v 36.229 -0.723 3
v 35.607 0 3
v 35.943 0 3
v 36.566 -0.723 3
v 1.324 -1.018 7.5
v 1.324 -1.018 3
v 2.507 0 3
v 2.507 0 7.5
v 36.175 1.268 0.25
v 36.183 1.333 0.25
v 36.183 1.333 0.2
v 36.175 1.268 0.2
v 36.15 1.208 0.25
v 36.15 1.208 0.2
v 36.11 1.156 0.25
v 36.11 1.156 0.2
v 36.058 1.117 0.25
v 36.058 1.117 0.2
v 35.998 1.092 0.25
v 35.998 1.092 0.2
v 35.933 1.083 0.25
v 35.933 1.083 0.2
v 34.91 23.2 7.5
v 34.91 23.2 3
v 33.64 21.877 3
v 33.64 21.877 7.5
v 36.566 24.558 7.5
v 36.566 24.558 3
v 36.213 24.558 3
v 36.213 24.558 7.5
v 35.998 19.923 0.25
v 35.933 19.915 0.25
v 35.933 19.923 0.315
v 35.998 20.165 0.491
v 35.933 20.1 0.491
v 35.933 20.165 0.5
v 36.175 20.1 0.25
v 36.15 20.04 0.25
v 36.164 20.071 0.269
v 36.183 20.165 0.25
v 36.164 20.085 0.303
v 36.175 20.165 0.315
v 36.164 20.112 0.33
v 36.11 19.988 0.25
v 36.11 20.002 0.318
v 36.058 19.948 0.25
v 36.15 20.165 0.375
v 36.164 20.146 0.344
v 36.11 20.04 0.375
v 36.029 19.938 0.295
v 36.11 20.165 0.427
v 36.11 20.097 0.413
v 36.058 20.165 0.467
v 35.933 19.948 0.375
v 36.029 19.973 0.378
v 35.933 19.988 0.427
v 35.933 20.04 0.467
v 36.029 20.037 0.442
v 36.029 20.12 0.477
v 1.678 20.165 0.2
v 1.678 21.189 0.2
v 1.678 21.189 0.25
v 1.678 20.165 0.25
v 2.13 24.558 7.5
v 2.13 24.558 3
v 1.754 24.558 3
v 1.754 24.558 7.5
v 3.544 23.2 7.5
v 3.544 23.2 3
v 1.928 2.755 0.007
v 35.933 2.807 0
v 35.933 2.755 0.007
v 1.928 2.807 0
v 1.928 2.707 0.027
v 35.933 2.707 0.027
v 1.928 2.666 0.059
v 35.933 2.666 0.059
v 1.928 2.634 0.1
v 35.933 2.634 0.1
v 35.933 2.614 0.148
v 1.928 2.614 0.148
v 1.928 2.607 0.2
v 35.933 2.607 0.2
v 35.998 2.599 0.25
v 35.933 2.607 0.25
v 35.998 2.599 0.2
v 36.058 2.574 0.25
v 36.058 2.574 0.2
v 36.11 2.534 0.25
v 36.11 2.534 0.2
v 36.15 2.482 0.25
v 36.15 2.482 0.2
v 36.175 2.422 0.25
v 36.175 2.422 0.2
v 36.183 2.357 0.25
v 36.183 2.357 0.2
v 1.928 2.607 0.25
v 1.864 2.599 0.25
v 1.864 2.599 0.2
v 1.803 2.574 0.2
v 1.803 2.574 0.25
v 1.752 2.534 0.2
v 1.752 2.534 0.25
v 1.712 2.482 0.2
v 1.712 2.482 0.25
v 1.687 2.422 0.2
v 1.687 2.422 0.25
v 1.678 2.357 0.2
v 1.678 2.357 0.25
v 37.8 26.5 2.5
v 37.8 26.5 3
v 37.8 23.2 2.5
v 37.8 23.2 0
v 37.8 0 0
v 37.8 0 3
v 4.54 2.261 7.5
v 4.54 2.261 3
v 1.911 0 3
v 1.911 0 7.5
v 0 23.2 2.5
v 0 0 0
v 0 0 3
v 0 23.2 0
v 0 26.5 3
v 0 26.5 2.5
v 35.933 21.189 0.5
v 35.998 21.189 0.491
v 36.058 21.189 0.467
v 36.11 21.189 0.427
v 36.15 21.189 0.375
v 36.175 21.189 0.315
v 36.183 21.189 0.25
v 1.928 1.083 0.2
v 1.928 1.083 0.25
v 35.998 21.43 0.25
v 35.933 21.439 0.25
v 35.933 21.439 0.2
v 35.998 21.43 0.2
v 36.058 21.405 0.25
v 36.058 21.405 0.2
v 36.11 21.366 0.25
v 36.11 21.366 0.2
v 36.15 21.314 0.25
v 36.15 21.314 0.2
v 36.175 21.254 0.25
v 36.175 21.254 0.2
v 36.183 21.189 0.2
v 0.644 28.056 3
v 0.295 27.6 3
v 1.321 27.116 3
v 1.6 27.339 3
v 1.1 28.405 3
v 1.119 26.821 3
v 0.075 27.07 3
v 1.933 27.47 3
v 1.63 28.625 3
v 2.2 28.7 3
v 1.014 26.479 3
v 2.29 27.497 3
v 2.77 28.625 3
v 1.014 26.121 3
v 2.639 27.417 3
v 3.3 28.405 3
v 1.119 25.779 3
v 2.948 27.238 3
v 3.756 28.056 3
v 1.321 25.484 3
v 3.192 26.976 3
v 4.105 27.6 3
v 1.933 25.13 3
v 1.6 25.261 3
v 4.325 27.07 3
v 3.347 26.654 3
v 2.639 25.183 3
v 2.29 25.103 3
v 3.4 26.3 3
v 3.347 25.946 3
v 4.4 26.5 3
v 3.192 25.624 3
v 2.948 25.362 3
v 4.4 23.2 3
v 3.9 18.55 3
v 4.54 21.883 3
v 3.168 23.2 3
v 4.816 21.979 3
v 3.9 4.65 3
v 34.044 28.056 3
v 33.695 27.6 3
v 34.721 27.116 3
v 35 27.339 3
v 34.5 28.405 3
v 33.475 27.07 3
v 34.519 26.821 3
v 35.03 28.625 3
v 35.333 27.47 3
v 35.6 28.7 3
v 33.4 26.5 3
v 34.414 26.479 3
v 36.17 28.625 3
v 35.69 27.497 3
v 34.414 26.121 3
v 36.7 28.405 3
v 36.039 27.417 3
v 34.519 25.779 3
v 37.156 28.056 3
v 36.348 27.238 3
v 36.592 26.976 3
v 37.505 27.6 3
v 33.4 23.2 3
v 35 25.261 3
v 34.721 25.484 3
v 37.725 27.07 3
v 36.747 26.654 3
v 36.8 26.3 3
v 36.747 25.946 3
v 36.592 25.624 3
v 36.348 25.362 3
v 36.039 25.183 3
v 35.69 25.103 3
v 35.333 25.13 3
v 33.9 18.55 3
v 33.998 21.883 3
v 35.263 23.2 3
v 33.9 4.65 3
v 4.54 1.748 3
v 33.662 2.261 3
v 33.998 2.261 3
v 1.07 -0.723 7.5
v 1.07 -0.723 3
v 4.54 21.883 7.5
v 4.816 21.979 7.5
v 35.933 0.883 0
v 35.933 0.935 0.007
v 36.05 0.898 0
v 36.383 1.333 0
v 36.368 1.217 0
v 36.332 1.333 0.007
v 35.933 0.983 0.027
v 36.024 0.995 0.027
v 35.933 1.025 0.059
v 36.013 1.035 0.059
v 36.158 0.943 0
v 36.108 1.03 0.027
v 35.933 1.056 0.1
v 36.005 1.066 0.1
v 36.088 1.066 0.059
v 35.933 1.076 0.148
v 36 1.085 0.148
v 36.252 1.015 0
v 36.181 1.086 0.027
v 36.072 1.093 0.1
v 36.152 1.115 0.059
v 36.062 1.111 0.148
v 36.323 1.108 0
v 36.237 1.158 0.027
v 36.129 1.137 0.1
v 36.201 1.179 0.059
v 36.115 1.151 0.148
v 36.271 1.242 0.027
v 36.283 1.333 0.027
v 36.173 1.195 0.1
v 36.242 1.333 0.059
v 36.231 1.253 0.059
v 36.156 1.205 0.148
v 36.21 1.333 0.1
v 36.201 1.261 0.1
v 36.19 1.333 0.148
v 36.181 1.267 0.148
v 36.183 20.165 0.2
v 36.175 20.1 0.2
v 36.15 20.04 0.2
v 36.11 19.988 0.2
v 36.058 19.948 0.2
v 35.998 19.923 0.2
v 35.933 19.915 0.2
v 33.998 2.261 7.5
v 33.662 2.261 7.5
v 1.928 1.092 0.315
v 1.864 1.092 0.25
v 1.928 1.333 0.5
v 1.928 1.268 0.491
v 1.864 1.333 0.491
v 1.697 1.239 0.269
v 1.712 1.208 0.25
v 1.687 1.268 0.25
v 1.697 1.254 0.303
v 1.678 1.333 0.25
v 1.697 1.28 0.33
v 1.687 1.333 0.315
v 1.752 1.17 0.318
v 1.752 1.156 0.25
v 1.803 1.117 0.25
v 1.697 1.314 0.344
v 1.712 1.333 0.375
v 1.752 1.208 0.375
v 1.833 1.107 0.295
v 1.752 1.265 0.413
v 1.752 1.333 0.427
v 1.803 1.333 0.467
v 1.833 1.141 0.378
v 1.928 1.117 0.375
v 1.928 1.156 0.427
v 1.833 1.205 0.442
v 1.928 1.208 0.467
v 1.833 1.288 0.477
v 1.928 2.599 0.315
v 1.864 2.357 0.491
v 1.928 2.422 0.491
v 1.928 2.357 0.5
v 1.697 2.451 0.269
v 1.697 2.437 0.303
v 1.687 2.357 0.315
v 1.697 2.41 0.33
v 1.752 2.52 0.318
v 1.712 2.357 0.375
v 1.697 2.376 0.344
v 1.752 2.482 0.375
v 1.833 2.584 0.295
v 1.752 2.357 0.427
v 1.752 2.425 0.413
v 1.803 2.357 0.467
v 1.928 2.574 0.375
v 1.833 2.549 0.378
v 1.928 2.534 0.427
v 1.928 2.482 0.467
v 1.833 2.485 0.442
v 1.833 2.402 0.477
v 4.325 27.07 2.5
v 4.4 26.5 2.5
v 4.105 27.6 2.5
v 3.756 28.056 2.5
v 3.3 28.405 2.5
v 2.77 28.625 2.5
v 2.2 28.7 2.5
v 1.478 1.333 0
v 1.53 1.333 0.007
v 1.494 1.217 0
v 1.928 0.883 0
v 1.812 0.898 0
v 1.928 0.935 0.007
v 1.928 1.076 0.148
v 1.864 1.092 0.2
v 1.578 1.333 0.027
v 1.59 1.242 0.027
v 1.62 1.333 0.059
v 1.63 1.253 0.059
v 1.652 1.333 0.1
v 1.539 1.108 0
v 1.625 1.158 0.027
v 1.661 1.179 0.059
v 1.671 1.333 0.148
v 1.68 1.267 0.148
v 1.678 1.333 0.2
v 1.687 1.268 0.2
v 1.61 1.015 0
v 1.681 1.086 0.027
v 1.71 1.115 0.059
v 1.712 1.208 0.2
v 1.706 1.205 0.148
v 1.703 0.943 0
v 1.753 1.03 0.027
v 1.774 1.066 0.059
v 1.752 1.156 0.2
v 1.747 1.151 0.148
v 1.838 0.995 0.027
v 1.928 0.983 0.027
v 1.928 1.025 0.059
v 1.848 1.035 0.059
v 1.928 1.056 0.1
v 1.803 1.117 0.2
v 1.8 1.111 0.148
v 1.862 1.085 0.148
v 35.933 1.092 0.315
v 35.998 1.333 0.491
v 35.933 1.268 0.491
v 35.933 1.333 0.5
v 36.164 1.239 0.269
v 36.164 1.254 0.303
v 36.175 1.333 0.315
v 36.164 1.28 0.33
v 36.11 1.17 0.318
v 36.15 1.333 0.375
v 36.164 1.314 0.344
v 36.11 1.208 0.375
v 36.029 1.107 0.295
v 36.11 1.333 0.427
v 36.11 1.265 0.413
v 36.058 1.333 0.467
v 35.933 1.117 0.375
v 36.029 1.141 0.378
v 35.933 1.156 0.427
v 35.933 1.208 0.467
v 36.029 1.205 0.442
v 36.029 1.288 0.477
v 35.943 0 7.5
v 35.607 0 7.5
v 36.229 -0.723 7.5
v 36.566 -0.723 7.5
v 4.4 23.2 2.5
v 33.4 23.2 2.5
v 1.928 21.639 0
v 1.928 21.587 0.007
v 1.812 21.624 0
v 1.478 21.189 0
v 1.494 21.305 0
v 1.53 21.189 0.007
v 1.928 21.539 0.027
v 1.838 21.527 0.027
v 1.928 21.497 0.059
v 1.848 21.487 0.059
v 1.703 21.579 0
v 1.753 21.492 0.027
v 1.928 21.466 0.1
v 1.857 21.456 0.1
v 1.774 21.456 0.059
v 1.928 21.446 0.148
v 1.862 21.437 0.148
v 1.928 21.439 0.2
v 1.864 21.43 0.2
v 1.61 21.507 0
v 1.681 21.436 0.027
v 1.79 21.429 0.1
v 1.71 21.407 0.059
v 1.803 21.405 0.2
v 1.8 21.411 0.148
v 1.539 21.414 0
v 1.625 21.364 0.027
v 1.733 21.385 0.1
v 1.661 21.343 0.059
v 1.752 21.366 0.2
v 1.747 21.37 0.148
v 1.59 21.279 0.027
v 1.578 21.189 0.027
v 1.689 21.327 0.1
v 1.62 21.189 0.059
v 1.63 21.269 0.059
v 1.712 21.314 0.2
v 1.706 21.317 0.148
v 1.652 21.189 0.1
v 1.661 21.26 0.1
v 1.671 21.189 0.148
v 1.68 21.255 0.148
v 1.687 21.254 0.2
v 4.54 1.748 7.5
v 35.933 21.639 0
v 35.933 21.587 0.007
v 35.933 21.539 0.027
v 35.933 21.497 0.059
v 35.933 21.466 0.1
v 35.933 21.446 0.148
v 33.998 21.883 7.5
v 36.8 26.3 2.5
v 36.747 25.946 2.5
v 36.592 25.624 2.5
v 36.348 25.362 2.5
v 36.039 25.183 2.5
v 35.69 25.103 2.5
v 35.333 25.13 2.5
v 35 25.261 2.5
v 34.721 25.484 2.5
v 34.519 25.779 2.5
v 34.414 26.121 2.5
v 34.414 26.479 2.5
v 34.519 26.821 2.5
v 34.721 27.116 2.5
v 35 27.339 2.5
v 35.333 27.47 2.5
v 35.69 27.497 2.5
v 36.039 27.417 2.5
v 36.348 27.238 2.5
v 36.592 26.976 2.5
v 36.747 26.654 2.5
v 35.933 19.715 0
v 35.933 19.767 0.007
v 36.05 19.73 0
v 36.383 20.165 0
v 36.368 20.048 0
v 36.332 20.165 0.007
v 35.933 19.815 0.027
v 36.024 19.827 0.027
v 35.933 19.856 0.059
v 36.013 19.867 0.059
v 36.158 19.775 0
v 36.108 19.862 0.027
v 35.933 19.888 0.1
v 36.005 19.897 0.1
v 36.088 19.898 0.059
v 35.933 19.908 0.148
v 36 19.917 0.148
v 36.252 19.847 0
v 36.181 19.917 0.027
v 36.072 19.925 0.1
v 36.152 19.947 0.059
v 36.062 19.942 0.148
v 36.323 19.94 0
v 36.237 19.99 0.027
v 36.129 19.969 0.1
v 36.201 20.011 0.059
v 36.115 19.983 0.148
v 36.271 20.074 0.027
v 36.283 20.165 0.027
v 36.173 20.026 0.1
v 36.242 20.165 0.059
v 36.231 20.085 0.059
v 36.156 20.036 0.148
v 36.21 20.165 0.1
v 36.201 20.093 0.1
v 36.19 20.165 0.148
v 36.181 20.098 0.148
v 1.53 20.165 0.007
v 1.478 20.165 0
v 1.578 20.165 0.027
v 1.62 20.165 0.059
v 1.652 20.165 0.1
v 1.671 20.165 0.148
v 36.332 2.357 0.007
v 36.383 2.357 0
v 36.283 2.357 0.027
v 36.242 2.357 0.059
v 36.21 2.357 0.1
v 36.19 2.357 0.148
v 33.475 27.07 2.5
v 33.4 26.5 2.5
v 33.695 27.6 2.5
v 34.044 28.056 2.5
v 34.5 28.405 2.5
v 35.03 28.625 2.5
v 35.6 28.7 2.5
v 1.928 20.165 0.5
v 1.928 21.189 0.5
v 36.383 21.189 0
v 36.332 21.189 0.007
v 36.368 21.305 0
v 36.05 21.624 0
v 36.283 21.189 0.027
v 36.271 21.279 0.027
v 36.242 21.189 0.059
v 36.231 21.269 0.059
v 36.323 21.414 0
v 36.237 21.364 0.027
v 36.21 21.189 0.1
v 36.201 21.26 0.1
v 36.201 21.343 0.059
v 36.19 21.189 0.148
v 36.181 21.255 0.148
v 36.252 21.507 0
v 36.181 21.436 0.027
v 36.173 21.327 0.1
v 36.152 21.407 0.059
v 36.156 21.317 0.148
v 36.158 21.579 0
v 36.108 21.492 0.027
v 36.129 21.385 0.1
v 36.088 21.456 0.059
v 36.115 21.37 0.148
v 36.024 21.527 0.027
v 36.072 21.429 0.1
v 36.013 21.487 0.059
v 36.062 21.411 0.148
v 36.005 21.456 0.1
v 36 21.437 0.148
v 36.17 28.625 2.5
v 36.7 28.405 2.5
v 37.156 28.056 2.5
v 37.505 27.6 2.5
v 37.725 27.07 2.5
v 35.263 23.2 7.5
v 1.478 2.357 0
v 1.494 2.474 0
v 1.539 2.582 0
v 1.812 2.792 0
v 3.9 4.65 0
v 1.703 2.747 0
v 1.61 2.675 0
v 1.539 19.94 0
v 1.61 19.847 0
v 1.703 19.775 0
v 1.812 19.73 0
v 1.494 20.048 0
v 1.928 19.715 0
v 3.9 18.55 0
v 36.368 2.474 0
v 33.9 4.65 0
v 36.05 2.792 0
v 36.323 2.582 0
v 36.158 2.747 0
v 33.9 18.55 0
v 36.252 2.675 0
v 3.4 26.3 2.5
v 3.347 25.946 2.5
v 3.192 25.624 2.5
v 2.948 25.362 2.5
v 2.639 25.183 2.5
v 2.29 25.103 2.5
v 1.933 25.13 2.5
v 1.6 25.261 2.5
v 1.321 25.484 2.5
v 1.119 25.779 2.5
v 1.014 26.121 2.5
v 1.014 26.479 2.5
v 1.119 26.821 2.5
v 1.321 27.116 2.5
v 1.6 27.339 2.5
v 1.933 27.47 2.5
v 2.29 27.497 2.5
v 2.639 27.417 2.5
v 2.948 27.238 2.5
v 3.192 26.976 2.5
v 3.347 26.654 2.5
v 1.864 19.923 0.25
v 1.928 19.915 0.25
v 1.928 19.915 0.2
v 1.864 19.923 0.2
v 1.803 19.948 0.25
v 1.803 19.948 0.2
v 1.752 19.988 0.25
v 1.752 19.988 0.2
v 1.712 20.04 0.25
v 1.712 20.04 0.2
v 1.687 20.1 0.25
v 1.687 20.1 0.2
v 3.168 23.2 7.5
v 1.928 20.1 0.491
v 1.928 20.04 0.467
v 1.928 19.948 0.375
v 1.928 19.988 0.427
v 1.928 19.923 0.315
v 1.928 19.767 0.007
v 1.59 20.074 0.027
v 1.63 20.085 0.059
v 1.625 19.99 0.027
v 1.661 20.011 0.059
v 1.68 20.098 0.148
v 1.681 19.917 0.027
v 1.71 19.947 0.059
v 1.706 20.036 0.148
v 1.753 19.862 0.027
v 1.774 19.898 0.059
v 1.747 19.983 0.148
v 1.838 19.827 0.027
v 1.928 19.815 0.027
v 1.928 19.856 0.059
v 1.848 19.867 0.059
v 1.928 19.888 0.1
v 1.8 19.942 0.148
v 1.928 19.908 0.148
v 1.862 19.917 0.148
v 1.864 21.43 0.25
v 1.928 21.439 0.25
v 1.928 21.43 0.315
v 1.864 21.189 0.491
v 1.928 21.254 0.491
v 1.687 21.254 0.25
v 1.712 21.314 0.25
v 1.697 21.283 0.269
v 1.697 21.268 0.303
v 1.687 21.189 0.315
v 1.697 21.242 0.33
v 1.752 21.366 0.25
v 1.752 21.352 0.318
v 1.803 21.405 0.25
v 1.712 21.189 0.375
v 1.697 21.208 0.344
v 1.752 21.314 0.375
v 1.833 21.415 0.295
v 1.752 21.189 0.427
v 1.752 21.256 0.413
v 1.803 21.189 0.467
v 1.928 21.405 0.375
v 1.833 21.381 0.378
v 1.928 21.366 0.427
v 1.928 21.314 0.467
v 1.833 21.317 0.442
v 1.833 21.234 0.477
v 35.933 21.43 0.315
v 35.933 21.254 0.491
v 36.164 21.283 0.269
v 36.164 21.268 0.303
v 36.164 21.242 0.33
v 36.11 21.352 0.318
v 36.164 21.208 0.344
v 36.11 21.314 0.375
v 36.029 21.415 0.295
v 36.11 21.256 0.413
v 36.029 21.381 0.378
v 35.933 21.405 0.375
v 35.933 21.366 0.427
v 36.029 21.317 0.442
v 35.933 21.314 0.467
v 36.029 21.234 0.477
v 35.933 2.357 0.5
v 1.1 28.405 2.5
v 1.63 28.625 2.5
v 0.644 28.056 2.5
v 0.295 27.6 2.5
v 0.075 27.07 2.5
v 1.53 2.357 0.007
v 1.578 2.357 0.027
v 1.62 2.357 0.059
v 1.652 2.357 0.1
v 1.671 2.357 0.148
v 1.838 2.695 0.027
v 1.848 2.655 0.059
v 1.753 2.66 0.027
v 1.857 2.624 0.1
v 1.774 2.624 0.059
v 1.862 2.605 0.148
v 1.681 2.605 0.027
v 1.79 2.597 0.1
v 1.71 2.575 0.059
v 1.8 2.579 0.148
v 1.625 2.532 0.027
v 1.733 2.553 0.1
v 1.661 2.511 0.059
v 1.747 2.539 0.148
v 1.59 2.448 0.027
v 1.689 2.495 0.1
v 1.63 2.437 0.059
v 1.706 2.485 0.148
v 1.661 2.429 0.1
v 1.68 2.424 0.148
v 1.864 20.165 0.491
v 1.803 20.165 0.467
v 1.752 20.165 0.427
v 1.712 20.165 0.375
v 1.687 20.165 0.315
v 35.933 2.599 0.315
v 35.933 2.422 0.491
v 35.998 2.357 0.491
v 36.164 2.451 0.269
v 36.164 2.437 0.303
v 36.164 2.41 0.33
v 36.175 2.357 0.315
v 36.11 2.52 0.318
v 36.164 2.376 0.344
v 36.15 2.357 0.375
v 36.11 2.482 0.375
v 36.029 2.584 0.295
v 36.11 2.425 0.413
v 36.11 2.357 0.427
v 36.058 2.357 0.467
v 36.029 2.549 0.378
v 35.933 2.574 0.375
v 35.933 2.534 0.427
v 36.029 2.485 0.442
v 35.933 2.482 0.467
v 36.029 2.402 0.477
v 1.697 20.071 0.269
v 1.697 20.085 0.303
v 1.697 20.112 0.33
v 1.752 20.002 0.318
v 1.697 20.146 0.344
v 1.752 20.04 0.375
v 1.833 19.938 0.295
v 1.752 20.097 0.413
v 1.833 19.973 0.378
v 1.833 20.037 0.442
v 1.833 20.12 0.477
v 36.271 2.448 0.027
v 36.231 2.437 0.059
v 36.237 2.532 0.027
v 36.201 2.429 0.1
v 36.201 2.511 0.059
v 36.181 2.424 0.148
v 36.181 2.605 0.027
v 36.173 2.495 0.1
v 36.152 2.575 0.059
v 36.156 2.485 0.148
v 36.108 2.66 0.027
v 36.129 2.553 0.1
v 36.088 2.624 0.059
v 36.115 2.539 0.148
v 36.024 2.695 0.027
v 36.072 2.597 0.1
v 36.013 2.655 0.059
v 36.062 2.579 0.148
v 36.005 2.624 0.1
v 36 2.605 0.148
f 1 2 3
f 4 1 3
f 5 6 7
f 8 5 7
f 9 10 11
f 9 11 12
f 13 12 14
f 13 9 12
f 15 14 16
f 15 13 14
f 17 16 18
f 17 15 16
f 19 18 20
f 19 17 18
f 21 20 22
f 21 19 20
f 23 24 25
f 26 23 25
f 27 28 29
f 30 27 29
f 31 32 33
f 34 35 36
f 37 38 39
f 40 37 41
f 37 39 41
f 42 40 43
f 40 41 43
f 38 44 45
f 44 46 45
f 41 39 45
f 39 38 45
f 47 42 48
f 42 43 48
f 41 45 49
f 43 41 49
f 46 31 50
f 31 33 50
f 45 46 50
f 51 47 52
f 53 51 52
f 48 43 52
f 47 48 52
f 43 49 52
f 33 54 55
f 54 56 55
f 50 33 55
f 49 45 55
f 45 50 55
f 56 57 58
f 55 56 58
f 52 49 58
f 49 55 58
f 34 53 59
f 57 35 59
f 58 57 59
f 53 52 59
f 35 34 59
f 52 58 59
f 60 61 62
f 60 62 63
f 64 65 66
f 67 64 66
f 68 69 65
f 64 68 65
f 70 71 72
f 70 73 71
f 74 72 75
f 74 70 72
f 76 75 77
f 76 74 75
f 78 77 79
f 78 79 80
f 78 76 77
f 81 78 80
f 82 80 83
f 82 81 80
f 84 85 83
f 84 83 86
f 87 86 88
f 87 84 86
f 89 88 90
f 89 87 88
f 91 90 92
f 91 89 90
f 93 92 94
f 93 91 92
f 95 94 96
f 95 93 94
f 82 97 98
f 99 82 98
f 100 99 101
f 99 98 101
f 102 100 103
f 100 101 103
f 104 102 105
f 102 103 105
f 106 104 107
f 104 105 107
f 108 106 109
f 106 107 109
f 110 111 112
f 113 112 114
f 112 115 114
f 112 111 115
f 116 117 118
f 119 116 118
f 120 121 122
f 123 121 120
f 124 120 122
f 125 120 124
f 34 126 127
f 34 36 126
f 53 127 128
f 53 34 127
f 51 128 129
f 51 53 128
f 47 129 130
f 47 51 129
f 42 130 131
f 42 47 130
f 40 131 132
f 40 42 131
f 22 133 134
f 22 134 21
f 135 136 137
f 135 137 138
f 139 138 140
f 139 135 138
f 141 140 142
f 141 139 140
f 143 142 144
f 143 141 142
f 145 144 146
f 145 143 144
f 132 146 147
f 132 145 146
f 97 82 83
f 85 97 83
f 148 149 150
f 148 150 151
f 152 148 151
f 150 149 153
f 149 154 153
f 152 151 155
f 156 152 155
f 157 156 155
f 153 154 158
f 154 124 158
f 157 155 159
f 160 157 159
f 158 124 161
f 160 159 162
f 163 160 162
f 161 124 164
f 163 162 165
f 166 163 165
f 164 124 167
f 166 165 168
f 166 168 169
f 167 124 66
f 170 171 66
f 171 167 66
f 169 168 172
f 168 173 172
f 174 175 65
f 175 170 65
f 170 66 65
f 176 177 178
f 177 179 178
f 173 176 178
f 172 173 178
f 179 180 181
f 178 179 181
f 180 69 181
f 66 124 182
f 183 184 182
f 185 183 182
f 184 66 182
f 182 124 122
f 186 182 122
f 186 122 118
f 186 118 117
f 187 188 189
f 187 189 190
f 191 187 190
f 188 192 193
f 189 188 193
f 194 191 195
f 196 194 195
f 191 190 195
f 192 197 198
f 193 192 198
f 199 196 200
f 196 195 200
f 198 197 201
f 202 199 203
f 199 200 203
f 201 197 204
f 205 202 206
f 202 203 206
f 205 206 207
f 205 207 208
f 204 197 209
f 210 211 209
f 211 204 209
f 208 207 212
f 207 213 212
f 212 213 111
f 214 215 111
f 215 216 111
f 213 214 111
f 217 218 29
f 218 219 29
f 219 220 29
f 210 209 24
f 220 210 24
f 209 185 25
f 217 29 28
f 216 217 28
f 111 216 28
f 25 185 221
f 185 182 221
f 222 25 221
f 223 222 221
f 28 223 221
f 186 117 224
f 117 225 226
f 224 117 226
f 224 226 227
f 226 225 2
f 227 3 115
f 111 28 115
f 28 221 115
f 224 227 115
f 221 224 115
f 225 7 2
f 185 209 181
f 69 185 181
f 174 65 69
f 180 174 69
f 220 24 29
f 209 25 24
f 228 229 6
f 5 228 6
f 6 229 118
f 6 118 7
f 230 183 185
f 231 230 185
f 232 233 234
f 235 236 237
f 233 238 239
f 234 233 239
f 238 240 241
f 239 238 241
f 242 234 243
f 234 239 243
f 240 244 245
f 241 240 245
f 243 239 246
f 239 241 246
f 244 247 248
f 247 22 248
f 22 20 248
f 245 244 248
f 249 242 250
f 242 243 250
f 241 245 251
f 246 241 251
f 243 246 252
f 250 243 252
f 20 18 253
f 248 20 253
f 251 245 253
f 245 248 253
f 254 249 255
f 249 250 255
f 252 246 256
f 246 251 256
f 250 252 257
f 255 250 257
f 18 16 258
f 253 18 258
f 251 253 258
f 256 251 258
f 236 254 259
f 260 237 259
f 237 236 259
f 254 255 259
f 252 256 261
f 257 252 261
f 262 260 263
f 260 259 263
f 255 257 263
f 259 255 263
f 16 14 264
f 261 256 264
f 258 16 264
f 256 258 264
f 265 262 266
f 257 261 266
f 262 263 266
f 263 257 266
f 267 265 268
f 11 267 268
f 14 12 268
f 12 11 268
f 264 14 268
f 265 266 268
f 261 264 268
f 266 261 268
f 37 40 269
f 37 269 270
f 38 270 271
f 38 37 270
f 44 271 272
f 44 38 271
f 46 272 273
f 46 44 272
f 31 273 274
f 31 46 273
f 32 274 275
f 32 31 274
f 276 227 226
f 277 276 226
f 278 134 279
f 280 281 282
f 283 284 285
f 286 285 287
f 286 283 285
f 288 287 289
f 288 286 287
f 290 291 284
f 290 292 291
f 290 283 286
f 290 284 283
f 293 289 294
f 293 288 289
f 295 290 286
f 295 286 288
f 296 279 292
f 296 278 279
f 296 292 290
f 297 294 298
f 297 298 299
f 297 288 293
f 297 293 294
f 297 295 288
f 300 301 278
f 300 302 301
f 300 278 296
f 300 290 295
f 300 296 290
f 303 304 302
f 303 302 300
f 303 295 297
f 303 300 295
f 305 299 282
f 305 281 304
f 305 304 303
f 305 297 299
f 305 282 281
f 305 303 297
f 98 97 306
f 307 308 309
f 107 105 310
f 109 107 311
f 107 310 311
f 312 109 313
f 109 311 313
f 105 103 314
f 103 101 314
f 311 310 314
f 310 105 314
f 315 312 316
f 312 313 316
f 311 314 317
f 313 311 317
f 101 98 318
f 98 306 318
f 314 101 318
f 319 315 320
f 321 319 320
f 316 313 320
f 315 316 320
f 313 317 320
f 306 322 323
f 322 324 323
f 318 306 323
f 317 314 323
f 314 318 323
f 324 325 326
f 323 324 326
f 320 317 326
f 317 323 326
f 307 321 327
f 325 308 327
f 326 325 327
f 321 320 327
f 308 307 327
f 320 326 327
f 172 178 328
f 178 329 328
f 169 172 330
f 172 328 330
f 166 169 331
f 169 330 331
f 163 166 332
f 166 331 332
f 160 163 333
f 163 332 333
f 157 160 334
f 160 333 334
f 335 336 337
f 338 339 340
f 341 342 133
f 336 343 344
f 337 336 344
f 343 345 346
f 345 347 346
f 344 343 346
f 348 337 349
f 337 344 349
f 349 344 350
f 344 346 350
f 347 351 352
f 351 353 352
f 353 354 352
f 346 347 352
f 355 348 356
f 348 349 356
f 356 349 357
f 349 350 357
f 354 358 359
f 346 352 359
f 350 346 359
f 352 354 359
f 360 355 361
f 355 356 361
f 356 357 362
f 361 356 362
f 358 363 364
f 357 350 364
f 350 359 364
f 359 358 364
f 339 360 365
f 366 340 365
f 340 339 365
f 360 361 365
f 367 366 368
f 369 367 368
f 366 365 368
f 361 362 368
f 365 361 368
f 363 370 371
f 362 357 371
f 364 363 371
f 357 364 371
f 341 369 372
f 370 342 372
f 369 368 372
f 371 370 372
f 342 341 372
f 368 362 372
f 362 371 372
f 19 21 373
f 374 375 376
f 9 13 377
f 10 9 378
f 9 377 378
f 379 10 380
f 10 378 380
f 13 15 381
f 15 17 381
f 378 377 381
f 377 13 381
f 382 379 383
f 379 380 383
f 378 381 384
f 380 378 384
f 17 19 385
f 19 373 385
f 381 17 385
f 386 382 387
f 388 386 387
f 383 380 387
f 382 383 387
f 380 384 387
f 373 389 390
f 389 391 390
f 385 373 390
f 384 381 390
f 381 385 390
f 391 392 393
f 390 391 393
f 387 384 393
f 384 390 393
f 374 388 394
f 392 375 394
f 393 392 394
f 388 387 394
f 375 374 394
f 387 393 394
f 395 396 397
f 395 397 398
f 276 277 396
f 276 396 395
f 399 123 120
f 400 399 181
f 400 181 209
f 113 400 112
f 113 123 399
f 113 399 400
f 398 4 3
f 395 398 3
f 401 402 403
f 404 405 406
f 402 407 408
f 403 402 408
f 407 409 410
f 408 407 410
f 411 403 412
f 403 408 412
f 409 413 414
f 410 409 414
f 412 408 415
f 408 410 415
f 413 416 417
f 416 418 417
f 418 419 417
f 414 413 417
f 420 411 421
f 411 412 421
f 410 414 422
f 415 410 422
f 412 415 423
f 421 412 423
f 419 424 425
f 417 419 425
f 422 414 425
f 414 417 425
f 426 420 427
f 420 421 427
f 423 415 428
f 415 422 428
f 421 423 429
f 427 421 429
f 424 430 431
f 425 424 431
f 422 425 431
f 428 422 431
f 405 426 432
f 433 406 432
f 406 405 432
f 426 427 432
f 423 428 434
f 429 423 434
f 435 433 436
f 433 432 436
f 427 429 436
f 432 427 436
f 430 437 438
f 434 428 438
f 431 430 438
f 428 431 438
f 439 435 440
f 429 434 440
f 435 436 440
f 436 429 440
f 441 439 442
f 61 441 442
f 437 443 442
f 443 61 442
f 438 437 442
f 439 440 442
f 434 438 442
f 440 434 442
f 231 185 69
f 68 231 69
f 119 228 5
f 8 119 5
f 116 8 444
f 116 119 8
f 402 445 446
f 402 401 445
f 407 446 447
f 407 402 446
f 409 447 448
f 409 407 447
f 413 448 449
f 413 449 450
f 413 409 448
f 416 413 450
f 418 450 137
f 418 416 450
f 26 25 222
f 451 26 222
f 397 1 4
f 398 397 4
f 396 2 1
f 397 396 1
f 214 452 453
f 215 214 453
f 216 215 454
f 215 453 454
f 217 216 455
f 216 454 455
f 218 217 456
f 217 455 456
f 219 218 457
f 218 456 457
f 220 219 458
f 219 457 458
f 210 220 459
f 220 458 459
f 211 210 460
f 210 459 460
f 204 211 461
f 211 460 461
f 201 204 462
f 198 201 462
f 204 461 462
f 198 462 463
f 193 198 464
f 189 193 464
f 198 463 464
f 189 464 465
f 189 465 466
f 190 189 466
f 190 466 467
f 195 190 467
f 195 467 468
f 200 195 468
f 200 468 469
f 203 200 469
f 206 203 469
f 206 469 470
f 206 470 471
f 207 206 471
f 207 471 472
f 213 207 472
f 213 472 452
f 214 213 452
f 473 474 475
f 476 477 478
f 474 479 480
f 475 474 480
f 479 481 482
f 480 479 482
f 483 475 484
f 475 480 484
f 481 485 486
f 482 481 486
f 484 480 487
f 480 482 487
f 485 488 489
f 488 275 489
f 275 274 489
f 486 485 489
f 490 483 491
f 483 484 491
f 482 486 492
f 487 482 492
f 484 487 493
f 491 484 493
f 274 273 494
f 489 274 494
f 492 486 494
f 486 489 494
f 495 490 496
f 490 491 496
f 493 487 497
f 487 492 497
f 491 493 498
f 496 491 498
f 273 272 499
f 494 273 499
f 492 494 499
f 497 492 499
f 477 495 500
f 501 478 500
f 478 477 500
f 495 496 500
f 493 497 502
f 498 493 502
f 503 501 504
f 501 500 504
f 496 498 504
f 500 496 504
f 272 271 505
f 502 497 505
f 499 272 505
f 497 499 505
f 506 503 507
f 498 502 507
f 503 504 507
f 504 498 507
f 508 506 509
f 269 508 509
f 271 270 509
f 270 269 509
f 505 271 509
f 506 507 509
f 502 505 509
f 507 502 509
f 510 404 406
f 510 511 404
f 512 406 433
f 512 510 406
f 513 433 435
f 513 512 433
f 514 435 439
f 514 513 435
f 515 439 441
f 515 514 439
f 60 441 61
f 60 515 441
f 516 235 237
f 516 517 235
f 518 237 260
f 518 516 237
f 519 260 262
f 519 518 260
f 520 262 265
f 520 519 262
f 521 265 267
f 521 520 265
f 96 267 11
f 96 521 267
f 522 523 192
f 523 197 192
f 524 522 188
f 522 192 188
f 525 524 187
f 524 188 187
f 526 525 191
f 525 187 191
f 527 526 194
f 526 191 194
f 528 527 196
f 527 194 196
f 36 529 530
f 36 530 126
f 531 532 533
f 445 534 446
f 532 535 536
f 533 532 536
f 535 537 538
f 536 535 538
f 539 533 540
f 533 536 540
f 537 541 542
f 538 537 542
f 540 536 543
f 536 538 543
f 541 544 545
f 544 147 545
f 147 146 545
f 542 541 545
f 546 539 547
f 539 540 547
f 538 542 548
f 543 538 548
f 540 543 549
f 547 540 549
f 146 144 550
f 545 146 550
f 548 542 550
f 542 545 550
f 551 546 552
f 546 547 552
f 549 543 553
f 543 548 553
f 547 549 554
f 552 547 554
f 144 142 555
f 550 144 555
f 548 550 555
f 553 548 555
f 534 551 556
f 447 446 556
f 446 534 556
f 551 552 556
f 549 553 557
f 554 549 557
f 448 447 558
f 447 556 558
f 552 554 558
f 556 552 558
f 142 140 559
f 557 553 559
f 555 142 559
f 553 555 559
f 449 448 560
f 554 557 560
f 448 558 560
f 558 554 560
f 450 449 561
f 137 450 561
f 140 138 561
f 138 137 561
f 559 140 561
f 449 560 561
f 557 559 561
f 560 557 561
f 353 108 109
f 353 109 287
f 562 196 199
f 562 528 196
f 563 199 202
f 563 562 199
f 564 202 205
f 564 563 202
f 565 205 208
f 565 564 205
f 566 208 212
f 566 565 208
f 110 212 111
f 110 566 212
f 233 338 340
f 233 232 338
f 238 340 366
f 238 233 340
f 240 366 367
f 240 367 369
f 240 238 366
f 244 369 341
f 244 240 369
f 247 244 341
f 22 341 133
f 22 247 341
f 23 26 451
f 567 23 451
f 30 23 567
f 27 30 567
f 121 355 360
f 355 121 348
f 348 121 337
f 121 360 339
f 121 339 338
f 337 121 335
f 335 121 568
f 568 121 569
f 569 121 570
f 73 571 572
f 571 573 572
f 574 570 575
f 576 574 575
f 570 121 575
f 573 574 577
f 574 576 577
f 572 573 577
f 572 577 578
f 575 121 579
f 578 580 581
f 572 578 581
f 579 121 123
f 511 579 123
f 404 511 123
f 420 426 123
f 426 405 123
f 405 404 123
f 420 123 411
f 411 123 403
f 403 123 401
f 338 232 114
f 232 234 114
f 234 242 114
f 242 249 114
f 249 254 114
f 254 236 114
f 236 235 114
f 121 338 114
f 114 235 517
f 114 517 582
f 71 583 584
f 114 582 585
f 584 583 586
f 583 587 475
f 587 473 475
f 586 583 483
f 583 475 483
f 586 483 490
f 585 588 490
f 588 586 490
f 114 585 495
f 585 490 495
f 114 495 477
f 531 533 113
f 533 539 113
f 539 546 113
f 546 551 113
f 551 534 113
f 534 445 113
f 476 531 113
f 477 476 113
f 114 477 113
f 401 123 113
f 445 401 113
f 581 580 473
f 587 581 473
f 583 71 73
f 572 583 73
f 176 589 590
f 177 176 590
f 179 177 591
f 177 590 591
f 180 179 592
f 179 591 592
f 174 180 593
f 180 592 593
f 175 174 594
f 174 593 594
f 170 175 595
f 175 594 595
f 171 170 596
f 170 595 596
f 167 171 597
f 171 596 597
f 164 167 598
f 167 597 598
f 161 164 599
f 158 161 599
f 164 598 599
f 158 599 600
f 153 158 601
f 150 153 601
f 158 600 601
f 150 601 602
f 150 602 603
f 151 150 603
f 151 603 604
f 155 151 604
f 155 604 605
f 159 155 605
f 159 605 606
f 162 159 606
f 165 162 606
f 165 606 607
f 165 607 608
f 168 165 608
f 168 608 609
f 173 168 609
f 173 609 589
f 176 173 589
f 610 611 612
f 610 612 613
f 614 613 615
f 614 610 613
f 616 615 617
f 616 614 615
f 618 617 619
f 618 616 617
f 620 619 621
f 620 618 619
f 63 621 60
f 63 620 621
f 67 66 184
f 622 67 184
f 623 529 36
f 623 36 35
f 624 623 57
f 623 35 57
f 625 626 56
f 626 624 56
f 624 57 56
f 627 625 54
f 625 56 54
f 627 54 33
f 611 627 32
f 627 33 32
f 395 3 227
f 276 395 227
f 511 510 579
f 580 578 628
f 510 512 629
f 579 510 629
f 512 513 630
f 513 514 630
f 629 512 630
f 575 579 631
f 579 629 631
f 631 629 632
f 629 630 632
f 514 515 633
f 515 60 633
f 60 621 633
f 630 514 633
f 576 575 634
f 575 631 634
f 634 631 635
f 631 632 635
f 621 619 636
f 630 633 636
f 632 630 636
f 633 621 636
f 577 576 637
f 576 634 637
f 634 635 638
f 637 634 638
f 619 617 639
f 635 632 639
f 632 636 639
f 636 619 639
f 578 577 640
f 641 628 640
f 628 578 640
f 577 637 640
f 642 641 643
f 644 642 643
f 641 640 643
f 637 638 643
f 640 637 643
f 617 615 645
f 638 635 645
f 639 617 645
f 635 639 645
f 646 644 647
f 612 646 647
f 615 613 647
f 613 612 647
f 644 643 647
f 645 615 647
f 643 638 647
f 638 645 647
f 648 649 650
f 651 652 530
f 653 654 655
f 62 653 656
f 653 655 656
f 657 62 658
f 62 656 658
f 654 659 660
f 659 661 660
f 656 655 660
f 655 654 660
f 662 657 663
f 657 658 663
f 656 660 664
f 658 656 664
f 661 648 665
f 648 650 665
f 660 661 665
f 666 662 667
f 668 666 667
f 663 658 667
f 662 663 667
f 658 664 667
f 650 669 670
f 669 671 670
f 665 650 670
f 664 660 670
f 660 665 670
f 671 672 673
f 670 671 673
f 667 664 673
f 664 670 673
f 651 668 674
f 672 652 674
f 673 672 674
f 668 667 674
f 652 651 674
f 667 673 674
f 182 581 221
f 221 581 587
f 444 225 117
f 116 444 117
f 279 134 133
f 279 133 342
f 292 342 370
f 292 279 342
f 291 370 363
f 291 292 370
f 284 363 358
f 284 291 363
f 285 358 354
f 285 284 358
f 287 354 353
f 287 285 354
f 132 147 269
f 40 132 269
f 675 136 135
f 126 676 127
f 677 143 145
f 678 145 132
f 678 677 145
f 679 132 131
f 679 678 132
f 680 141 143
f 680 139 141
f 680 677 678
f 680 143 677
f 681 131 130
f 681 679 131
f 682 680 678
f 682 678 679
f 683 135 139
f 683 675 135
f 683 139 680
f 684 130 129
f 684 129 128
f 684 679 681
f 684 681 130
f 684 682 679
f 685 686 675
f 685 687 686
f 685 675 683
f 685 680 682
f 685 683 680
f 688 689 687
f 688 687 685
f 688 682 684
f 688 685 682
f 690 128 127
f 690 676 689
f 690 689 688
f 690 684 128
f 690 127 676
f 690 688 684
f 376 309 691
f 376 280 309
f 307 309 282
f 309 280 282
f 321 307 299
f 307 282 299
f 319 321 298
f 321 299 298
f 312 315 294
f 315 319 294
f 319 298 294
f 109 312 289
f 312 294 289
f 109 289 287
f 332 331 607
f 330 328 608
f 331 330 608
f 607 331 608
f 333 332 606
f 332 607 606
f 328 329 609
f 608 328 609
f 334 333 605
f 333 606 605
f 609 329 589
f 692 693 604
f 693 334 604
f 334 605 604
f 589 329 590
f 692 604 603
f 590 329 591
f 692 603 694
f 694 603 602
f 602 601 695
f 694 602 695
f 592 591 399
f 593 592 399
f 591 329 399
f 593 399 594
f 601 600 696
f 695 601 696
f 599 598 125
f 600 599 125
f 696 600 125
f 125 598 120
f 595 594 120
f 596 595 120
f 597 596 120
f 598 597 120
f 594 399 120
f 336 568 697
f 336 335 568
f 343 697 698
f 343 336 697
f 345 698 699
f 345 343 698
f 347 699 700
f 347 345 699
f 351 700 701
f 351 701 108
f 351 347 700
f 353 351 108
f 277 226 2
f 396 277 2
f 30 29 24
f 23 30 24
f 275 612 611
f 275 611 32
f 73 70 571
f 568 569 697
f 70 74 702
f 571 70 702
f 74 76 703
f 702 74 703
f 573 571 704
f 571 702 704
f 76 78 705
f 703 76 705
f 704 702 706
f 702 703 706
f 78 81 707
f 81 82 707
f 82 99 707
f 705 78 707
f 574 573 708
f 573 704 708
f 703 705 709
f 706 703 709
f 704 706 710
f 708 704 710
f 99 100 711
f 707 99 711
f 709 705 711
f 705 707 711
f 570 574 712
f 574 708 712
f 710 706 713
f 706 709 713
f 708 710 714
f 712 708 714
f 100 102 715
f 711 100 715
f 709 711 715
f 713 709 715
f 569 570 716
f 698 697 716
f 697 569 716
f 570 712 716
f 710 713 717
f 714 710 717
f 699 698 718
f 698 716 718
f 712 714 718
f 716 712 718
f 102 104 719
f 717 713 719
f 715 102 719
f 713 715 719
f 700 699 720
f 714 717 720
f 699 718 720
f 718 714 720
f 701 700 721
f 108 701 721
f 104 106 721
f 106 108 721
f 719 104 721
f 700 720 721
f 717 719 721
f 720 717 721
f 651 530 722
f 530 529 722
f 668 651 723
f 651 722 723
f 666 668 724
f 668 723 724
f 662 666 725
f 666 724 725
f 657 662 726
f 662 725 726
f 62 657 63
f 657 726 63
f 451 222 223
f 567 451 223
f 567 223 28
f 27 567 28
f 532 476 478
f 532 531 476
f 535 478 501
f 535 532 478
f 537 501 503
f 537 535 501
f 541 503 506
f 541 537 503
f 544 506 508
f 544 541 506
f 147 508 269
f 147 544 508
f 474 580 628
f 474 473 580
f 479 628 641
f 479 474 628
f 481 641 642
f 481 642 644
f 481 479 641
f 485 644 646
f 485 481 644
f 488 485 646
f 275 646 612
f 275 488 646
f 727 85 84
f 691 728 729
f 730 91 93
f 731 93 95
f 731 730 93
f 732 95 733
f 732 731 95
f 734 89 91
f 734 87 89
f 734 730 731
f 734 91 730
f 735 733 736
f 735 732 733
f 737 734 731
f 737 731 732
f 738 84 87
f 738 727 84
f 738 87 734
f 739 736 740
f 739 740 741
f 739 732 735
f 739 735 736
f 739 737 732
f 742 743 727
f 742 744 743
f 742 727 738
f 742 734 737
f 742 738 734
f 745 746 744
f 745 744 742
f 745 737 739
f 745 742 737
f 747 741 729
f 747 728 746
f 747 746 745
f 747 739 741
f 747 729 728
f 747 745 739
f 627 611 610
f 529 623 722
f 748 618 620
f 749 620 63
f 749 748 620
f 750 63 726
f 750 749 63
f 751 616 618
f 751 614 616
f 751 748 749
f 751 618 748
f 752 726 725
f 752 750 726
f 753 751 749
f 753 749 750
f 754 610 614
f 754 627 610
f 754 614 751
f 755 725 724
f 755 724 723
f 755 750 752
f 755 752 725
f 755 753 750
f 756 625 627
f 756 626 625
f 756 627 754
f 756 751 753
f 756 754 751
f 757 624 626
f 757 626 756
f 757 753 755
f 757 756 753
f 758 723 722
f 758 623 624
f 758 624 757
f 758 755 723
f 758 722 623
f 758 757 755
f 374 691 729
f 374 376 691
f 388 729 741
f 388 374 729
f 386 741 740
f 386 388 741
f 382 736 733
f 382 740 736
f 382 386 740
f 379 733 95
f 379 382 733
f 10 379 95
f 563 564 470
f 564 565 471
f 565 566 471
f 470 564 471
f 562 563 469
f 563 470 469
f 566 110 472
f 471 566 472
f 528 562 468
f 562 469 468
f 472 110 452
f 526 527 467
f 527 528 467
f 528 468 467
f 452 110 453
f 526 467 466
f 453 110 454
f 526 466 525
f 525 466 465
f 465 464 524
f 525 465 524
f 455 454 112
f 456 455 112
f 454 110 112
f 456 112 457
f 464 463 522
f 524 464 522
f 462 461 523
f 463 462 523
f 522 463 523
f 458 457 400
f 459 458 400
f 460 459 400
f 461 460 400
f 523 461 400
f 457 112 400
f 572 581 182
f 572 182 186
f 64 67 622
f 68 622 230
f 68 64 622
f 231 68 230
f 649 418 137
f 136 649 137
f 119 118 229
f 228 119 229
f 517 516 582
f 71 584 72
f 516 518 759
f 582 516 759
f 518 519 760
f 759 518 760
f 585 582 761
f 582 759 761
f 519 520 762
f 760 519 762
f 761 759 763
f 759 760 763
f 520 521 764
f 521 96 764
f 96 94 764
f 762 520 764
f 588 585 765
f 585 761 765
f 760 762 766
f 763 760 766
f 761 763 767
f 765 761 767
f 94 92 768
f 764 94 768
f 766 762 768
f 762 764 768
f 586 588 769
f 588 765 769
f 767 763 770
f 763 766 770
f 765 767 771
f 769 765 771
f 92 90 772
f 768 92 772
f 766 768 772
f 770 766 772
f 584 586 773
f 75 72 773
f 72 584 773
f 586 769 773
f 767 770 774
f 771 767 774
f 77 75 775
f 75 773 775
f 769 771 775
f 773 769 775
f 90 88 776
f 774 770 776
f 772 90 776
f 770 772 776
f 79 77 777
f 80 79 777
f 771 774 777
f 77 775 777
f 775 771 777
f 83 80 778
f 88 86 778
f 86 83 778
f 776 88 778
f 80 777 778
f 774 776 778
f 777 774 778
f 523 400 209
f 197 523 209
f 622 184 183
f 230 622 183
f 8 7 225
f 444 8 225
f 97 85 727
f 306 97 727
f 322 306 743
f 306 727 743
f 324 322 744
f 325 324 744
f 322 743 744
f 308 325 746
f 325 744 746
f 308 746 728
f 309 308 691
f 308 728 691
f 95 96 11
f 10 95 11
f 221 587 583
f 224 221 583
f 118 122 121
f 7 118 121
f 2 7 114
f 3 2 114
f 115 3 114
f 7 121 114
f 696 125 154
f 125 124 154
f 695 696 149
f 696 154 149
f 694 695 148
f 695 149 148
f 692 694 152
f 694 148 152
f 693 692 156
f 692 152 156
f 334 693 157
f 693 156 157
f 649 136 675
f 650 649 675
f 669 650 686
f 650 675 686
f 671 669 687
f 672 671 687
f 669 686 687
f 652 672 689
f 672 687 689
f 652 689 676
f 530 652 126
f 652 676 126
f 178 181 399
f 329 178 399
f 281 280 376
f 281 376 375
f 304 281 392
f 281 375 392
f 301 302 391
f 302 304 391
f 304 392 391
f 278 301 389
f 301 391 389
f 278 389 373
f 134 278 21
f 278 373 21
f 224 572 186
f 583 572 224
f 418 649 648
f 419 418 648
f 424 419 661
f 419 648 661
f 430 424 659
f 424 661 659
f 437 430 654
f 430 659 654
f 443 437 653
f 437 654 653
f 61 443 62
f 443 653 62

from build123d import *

# Parameters (mm, degrees)
F0_W      = 37.8
F0_H      = 23.2
F1_DEPTH  = 3
F3_DEPTH  = 4.5
F4_W      = 30
F4_H      = 13.9
F5_DEPTH  = 25.4
F4_W_2    = 34.5051246695
F4_H_2    = 1.524
F6_DEPTH  = 0.5
F7_R      = 0.25
F8_R      = 0.2
F9_R      = 0.2
F11_DEPTH = 5.5
F12_R     = 2.19964
F13_R     = 2.19964
F15_R     = 1.2
F14_R     = 1.2
F16_DEPTH = 25.4


with BuildPart() as f1:
    # F0 (on Top) → F1 (new body)
    with BuildSketch(Plane.XY):
        with Locations((18.9, 11.6)):
            Rectangle(F0_W, F0_H)
    extrude(amount=F1_DEPTH)

    # F2 (on face) → F3 (join)
    with BuildSketch(Plane.XY.offset(3)):
        Polygon((1.7535259355, 24.5575234294), (3.1678657052, 23.2), (3.544374615, 23.2), (2.1300348453, 24.5575234294), align=None)
        Polygon((3.544374615, 23.2), (3.1678657052, 23.2), (4.5401435345, 21.8828488141), (4.8160737062, 21.97938714), align=None)
        Polygon((2.5074673859, 0), (1.9109652349, 0), (1.0702608852, -0.7231329801), (1.3239181902, -1.0180314366), align=None)
        Polygon((4.5401435345, 1.7484091301), (4.5401435345, 2.2614912596), (1.9109652349, 0), (2.5074673859, 0), align=None)
        Polygon((33.6620093499, 2.2614912596), (35.6072341062, 0), (35.9434980693, 0), (33.998273313, 2.2614912596), align=None)
        Polygon((35.9434980693, 0), (35.6072341062, 0), (36.2292379141, -0.7231329801), (36.5655018772, -0.7231329801), align=None)
        Polygon((36.2128205597, 24.5575234294), (34.9098310654, 23.2), (35.2625123829, 23.2), (36.5655018772, 24.5575234294), align=None)
        Polygon((35.2625123829, 23.2), (34.9098310654, 23.2), (33.6403721345, 21.8774104865), (33.998273313, 21.8828488141), align=None)
    extrude(amount=F3_DEPTH)

    # F4 (on face) → F5 (cut)
    with BuildSketch(Plane(origin=(0, 0, 0), x_dir=(1, 0, 0), z_dir=(0, 0, -1))):
        with Locations((18.9, -11.6)):
            Rectangle(F4_W, F4_H)
    extrude(amount=-F5_DEPTH, mode=Mode.SUBTRACT)

    # F4 (on face) → F6 (cut)
    with BuildSketch(Plane(origin=(0, 0, 0), x_dir=(1, 0, 0), z_dir=(0, 0, -1))):
        with Locations((18.9, -11.6)):
            Rectangle(F4_W, F4_H)
        with Locations((18.9308619592, -1.8450859749)):
            Rectangle(F4_W_2, F4_H_2)
        with Locations((18.9308619592, -20.676838914)):
            Rectangle(F4_W_2, F4_H_2)
    extrude(amount=-F6_DEPTH, mode=Mode.SUBTRACT)

    # F7
    f7_edges = [f1.edges().sort_by_distance(p)[0] for p in [
        (18.930862, 2.607086, 0.5),
        (18.930862, 1.083086, 0.5),
        (18.930862, 19.914839, 0.5),
        (18.930862, 21.438839, 0.5),
        (1.6783, 19.914839, 0.25),
        (1.6783, 21.438839, 0.25),
        (1.6783, 2.607086, 0.25),
        (1.6783, 1.083086, 0.25),
        (1.6783, 1.845086, 0.5),
        (1.6783, 20.676839, 0.5),
        (36.183424, 19.914839, 0.25),
        (36.183424, 21.438839, 0.25),
        (36.183424, 20.676839, 0.5),
        (36.183424, 1.083086, 0.25),
        (36.183424, 2.607086, 0.25),
        (36.183424, 1.845086, 0.5),
    ]]
    fillet(f7_edges, radius=F7_R)

    # F8
    f8_edges = [f1.edges().sort_by_distance(p)[0] for p in [
        (18.930862, 1.083086, 0),
        (36.183424, 1.845086, 0),
        (36.110201, 1.156309, 0),
        (36.110201, 2.533863, 0),
        (1.6783, 1.845086, 0),
        (1.751523, 1.156309, 0),
        (1.751523, 2.533863, 0),
        (18.930862, 2.607086, 0),
    ]]
    fillet(f8_edges, radius=F8_R)

    # F9
    f9_edges = [f1.edges().sort_by_distance(p)[0] for p in [
        (18.930862, 19.914839, 0),
        (36.110201, 19.988062, 0),
        (36.183424, 20.676839, 0),
        (36.110201, 21.365616, 0),
        (18.930862, 21.438839, 0),
        (1.751523, 21.365616, 0),
        (1.6783, 20.676839, 0),
        (1.751523, 19.988062, 0),
    ]]
    fillet(f9_edges, radius=F9_R)

    # F10 (on face) → F11 (join)
    with BuildSketch(Plane(origin=(0, 23.2, 0), x_dir=(-1, 0, 0), z_dir=(0, 1, 0))):
        Polygon((-33.4, 2.5), (-33.4, 3), (-34.9098310654, 3), (-35.2625123829, 3), (-37.8, 3), (-37.8, 2.5), align=None)
        Polygon((0, 2.5), (0, 3), (-3.1678657052, 3), (-3.544374615, 3), (-4.4, 3), (-4.4, 2.5), align=None)
    extrude(amount=F11_DEPTH)

    # F12
    f12_edges = [f1.edges().sort_by_distance(p)[0] for p in [
        (0, 28.7, 2.75),
        (4.4, 28.7, 2.75),
    ]]
    fillet(f12_edges, radius=F12_R)

    # F13
    f13_edges = [f1.edges().sort_by_distance(p)[0] for p in [
        (33.4, 28.7, 2.75),
        (37.8, 28.7, 2.75),
    ]]
    fillet(f13_edges, radius=F13_R)

    # F15 (on face) + F14 (on face) → F16 (cut)
    with BuildSketch(Plane(origin=(0, 0, 2.5), x_dir=(1, 0, 0), z_dir=(0, 0, -1))):
        with Locations((2.2002029091, -26.3000000051)):
            Circle(F15_R)
    with BuildSketch(Plane(origin=(0, 0, 2.5), x_dir=(1, 0, 0), z_dir=(0, 0, -1))):
        with Locations((35.6002029091, -26.3000000051)):
            Circle(F14_R)
    extrude(amount=-F16_DEPTH, mode=Mode.SUBTRACT)


solid = f1.part
